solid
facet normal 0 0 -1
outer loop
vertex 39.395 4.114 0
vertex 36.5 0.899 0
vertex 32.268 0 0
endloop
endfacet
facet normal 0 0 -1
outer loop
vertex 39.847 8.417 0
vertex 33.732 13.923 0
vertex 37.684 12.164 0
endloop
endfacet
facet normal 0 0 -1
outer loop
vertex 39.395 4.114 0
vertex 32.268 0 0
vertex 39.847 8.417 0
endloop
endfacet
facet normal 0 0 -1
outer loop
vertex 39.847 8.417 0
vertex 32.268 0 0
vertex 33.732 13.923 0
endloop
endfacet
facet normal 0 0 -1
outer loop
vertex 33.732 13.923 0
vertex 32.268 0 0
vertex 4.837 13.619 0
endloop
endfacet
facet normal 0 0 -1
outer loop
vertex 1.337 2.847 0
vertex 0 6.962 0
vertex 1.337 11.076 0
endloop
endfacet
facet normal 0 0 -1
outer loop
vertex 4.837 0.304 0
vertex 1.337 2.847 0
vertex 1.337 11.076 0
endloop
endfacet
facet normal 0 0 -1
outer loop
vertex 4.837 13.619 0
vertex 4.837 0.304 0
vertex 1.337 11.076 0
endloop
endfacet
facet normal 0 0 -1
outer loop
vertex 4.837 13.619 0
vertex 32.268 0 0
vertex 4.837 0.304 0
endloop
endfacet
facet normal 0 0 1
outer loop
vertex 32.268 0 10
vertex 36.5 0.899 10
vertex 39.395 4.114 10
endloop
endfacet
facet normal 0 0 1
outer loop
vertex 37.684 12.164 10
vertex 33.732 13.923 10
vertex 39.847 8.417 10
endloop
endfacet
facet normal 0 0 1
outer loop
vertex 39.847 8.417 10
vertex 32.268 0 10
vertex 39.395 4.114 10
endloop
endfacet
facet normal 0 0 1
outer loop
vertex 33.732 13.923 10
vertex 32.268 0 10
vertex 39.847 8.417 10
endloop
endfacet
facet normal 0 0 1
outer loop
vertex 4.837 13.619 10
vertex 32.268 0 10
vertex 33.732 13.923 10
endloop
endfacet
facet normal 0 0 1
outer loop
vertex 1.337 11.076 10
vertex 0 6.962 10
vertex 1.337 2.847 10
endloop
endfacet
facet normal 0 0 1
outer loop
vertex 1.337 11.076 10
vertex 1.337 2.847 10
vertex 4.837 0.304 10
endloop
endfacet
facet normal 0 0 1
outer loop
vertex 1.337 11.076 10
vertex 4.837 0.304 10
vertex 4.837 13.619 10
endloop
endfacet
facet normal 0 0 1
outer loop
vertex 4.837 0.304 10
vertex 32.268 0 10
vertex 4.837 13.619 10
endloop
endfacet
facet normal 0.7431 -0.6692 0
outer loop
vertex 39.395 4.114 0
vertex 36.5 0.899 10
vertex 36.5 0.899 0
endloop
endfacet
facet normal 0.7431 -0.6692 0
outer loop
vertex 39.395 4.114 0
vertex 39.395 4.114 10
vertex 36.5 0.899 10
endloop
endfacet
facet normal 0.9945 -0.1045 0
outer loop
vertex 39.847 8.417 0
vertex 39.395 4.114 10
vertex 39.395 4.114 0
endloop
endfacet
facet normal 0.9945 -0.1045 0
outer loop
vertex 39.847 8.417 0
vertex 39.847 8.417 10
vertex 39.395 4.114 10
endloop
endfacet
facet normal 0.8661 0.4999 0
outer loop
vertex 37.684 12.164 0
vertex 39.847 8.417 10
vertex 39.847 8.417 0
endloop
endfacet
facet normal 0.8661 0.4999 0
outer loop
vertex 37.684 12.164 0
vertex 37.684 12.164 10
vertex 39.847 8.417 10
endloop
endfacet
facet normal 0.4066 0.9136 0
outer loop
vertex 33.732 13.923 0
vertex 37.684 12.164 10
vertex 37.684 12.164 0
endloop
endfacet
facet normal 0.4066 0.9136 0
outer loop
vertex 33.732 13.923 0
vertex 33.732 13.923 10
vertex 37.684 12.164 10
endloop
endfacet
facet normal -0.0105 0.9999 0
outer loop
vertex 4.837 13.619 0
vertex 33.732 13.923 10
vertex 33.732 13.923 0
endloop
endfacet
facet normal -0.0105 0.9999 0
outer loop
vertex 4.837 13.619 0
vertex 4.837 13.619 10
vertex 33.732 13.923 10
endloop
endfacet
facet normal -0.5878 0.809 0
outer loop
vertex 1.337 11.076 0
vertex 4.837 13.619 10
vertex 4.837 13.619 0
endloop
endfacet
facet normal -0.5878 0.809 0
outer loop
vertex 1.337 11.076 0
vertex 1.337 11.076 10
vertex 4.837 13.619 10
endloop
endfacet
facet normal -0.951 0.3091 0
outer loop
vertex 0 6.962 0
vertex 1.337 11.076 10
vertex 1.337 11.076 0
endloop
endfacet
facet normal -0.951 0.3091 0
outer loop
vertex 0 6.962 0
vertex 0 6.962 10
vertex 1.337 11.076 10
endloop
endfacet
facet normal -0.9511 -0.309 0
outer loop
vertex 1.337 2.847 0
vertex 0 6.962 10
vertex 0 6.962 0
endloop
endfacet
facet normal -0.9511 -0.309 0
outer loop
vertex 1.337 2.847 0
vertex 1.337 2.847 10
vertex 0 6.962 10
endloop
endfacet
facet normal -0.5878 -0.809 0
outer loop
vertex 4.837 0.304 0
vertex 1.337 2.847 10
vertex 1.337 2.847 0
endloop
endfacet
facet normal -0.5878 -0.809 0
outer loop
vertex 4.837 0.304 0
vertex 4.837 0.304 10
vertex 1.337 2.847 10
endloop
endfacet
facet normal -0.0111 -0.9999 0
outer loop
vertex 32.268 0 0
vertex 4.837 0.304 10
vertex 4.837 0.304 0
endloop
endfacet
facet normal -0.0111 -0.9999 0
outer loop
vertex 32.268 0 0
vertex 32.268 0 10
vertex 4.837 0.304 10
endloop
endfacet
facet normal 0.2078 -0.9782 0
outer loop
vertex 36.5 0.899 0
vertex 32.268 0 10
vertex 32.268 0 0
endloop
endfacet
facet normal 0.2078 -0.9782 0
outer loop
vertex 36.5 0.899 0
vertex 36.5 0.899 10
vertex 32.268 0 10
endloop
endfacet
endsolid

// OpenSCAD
$fn = 32;

// ----------------------------------------------------------------------
// Key bar: parallel key, 10 mm thick
// ----------------------------------------------------------------------

// --- parameters (mm) ---
profile_height = 10;      // extrusion height
profile_points = 11;      // points of the closed outline

profile = [[0, 6.962], [1.337, 2.847], [4.837, 0.304], [32.268, 0], [36.5, 0.899], [39.395, 4.114], [39.847, 8.417], [37.684, 12.164], [33.732, 13.923], [4.837, 13.619], [1.337, 11.076]];  // single closed polygon, 11 points, counter clockwise

// --- the one profile operation ---
linear_extrude(height = profile_height) polygon(points = profile);
